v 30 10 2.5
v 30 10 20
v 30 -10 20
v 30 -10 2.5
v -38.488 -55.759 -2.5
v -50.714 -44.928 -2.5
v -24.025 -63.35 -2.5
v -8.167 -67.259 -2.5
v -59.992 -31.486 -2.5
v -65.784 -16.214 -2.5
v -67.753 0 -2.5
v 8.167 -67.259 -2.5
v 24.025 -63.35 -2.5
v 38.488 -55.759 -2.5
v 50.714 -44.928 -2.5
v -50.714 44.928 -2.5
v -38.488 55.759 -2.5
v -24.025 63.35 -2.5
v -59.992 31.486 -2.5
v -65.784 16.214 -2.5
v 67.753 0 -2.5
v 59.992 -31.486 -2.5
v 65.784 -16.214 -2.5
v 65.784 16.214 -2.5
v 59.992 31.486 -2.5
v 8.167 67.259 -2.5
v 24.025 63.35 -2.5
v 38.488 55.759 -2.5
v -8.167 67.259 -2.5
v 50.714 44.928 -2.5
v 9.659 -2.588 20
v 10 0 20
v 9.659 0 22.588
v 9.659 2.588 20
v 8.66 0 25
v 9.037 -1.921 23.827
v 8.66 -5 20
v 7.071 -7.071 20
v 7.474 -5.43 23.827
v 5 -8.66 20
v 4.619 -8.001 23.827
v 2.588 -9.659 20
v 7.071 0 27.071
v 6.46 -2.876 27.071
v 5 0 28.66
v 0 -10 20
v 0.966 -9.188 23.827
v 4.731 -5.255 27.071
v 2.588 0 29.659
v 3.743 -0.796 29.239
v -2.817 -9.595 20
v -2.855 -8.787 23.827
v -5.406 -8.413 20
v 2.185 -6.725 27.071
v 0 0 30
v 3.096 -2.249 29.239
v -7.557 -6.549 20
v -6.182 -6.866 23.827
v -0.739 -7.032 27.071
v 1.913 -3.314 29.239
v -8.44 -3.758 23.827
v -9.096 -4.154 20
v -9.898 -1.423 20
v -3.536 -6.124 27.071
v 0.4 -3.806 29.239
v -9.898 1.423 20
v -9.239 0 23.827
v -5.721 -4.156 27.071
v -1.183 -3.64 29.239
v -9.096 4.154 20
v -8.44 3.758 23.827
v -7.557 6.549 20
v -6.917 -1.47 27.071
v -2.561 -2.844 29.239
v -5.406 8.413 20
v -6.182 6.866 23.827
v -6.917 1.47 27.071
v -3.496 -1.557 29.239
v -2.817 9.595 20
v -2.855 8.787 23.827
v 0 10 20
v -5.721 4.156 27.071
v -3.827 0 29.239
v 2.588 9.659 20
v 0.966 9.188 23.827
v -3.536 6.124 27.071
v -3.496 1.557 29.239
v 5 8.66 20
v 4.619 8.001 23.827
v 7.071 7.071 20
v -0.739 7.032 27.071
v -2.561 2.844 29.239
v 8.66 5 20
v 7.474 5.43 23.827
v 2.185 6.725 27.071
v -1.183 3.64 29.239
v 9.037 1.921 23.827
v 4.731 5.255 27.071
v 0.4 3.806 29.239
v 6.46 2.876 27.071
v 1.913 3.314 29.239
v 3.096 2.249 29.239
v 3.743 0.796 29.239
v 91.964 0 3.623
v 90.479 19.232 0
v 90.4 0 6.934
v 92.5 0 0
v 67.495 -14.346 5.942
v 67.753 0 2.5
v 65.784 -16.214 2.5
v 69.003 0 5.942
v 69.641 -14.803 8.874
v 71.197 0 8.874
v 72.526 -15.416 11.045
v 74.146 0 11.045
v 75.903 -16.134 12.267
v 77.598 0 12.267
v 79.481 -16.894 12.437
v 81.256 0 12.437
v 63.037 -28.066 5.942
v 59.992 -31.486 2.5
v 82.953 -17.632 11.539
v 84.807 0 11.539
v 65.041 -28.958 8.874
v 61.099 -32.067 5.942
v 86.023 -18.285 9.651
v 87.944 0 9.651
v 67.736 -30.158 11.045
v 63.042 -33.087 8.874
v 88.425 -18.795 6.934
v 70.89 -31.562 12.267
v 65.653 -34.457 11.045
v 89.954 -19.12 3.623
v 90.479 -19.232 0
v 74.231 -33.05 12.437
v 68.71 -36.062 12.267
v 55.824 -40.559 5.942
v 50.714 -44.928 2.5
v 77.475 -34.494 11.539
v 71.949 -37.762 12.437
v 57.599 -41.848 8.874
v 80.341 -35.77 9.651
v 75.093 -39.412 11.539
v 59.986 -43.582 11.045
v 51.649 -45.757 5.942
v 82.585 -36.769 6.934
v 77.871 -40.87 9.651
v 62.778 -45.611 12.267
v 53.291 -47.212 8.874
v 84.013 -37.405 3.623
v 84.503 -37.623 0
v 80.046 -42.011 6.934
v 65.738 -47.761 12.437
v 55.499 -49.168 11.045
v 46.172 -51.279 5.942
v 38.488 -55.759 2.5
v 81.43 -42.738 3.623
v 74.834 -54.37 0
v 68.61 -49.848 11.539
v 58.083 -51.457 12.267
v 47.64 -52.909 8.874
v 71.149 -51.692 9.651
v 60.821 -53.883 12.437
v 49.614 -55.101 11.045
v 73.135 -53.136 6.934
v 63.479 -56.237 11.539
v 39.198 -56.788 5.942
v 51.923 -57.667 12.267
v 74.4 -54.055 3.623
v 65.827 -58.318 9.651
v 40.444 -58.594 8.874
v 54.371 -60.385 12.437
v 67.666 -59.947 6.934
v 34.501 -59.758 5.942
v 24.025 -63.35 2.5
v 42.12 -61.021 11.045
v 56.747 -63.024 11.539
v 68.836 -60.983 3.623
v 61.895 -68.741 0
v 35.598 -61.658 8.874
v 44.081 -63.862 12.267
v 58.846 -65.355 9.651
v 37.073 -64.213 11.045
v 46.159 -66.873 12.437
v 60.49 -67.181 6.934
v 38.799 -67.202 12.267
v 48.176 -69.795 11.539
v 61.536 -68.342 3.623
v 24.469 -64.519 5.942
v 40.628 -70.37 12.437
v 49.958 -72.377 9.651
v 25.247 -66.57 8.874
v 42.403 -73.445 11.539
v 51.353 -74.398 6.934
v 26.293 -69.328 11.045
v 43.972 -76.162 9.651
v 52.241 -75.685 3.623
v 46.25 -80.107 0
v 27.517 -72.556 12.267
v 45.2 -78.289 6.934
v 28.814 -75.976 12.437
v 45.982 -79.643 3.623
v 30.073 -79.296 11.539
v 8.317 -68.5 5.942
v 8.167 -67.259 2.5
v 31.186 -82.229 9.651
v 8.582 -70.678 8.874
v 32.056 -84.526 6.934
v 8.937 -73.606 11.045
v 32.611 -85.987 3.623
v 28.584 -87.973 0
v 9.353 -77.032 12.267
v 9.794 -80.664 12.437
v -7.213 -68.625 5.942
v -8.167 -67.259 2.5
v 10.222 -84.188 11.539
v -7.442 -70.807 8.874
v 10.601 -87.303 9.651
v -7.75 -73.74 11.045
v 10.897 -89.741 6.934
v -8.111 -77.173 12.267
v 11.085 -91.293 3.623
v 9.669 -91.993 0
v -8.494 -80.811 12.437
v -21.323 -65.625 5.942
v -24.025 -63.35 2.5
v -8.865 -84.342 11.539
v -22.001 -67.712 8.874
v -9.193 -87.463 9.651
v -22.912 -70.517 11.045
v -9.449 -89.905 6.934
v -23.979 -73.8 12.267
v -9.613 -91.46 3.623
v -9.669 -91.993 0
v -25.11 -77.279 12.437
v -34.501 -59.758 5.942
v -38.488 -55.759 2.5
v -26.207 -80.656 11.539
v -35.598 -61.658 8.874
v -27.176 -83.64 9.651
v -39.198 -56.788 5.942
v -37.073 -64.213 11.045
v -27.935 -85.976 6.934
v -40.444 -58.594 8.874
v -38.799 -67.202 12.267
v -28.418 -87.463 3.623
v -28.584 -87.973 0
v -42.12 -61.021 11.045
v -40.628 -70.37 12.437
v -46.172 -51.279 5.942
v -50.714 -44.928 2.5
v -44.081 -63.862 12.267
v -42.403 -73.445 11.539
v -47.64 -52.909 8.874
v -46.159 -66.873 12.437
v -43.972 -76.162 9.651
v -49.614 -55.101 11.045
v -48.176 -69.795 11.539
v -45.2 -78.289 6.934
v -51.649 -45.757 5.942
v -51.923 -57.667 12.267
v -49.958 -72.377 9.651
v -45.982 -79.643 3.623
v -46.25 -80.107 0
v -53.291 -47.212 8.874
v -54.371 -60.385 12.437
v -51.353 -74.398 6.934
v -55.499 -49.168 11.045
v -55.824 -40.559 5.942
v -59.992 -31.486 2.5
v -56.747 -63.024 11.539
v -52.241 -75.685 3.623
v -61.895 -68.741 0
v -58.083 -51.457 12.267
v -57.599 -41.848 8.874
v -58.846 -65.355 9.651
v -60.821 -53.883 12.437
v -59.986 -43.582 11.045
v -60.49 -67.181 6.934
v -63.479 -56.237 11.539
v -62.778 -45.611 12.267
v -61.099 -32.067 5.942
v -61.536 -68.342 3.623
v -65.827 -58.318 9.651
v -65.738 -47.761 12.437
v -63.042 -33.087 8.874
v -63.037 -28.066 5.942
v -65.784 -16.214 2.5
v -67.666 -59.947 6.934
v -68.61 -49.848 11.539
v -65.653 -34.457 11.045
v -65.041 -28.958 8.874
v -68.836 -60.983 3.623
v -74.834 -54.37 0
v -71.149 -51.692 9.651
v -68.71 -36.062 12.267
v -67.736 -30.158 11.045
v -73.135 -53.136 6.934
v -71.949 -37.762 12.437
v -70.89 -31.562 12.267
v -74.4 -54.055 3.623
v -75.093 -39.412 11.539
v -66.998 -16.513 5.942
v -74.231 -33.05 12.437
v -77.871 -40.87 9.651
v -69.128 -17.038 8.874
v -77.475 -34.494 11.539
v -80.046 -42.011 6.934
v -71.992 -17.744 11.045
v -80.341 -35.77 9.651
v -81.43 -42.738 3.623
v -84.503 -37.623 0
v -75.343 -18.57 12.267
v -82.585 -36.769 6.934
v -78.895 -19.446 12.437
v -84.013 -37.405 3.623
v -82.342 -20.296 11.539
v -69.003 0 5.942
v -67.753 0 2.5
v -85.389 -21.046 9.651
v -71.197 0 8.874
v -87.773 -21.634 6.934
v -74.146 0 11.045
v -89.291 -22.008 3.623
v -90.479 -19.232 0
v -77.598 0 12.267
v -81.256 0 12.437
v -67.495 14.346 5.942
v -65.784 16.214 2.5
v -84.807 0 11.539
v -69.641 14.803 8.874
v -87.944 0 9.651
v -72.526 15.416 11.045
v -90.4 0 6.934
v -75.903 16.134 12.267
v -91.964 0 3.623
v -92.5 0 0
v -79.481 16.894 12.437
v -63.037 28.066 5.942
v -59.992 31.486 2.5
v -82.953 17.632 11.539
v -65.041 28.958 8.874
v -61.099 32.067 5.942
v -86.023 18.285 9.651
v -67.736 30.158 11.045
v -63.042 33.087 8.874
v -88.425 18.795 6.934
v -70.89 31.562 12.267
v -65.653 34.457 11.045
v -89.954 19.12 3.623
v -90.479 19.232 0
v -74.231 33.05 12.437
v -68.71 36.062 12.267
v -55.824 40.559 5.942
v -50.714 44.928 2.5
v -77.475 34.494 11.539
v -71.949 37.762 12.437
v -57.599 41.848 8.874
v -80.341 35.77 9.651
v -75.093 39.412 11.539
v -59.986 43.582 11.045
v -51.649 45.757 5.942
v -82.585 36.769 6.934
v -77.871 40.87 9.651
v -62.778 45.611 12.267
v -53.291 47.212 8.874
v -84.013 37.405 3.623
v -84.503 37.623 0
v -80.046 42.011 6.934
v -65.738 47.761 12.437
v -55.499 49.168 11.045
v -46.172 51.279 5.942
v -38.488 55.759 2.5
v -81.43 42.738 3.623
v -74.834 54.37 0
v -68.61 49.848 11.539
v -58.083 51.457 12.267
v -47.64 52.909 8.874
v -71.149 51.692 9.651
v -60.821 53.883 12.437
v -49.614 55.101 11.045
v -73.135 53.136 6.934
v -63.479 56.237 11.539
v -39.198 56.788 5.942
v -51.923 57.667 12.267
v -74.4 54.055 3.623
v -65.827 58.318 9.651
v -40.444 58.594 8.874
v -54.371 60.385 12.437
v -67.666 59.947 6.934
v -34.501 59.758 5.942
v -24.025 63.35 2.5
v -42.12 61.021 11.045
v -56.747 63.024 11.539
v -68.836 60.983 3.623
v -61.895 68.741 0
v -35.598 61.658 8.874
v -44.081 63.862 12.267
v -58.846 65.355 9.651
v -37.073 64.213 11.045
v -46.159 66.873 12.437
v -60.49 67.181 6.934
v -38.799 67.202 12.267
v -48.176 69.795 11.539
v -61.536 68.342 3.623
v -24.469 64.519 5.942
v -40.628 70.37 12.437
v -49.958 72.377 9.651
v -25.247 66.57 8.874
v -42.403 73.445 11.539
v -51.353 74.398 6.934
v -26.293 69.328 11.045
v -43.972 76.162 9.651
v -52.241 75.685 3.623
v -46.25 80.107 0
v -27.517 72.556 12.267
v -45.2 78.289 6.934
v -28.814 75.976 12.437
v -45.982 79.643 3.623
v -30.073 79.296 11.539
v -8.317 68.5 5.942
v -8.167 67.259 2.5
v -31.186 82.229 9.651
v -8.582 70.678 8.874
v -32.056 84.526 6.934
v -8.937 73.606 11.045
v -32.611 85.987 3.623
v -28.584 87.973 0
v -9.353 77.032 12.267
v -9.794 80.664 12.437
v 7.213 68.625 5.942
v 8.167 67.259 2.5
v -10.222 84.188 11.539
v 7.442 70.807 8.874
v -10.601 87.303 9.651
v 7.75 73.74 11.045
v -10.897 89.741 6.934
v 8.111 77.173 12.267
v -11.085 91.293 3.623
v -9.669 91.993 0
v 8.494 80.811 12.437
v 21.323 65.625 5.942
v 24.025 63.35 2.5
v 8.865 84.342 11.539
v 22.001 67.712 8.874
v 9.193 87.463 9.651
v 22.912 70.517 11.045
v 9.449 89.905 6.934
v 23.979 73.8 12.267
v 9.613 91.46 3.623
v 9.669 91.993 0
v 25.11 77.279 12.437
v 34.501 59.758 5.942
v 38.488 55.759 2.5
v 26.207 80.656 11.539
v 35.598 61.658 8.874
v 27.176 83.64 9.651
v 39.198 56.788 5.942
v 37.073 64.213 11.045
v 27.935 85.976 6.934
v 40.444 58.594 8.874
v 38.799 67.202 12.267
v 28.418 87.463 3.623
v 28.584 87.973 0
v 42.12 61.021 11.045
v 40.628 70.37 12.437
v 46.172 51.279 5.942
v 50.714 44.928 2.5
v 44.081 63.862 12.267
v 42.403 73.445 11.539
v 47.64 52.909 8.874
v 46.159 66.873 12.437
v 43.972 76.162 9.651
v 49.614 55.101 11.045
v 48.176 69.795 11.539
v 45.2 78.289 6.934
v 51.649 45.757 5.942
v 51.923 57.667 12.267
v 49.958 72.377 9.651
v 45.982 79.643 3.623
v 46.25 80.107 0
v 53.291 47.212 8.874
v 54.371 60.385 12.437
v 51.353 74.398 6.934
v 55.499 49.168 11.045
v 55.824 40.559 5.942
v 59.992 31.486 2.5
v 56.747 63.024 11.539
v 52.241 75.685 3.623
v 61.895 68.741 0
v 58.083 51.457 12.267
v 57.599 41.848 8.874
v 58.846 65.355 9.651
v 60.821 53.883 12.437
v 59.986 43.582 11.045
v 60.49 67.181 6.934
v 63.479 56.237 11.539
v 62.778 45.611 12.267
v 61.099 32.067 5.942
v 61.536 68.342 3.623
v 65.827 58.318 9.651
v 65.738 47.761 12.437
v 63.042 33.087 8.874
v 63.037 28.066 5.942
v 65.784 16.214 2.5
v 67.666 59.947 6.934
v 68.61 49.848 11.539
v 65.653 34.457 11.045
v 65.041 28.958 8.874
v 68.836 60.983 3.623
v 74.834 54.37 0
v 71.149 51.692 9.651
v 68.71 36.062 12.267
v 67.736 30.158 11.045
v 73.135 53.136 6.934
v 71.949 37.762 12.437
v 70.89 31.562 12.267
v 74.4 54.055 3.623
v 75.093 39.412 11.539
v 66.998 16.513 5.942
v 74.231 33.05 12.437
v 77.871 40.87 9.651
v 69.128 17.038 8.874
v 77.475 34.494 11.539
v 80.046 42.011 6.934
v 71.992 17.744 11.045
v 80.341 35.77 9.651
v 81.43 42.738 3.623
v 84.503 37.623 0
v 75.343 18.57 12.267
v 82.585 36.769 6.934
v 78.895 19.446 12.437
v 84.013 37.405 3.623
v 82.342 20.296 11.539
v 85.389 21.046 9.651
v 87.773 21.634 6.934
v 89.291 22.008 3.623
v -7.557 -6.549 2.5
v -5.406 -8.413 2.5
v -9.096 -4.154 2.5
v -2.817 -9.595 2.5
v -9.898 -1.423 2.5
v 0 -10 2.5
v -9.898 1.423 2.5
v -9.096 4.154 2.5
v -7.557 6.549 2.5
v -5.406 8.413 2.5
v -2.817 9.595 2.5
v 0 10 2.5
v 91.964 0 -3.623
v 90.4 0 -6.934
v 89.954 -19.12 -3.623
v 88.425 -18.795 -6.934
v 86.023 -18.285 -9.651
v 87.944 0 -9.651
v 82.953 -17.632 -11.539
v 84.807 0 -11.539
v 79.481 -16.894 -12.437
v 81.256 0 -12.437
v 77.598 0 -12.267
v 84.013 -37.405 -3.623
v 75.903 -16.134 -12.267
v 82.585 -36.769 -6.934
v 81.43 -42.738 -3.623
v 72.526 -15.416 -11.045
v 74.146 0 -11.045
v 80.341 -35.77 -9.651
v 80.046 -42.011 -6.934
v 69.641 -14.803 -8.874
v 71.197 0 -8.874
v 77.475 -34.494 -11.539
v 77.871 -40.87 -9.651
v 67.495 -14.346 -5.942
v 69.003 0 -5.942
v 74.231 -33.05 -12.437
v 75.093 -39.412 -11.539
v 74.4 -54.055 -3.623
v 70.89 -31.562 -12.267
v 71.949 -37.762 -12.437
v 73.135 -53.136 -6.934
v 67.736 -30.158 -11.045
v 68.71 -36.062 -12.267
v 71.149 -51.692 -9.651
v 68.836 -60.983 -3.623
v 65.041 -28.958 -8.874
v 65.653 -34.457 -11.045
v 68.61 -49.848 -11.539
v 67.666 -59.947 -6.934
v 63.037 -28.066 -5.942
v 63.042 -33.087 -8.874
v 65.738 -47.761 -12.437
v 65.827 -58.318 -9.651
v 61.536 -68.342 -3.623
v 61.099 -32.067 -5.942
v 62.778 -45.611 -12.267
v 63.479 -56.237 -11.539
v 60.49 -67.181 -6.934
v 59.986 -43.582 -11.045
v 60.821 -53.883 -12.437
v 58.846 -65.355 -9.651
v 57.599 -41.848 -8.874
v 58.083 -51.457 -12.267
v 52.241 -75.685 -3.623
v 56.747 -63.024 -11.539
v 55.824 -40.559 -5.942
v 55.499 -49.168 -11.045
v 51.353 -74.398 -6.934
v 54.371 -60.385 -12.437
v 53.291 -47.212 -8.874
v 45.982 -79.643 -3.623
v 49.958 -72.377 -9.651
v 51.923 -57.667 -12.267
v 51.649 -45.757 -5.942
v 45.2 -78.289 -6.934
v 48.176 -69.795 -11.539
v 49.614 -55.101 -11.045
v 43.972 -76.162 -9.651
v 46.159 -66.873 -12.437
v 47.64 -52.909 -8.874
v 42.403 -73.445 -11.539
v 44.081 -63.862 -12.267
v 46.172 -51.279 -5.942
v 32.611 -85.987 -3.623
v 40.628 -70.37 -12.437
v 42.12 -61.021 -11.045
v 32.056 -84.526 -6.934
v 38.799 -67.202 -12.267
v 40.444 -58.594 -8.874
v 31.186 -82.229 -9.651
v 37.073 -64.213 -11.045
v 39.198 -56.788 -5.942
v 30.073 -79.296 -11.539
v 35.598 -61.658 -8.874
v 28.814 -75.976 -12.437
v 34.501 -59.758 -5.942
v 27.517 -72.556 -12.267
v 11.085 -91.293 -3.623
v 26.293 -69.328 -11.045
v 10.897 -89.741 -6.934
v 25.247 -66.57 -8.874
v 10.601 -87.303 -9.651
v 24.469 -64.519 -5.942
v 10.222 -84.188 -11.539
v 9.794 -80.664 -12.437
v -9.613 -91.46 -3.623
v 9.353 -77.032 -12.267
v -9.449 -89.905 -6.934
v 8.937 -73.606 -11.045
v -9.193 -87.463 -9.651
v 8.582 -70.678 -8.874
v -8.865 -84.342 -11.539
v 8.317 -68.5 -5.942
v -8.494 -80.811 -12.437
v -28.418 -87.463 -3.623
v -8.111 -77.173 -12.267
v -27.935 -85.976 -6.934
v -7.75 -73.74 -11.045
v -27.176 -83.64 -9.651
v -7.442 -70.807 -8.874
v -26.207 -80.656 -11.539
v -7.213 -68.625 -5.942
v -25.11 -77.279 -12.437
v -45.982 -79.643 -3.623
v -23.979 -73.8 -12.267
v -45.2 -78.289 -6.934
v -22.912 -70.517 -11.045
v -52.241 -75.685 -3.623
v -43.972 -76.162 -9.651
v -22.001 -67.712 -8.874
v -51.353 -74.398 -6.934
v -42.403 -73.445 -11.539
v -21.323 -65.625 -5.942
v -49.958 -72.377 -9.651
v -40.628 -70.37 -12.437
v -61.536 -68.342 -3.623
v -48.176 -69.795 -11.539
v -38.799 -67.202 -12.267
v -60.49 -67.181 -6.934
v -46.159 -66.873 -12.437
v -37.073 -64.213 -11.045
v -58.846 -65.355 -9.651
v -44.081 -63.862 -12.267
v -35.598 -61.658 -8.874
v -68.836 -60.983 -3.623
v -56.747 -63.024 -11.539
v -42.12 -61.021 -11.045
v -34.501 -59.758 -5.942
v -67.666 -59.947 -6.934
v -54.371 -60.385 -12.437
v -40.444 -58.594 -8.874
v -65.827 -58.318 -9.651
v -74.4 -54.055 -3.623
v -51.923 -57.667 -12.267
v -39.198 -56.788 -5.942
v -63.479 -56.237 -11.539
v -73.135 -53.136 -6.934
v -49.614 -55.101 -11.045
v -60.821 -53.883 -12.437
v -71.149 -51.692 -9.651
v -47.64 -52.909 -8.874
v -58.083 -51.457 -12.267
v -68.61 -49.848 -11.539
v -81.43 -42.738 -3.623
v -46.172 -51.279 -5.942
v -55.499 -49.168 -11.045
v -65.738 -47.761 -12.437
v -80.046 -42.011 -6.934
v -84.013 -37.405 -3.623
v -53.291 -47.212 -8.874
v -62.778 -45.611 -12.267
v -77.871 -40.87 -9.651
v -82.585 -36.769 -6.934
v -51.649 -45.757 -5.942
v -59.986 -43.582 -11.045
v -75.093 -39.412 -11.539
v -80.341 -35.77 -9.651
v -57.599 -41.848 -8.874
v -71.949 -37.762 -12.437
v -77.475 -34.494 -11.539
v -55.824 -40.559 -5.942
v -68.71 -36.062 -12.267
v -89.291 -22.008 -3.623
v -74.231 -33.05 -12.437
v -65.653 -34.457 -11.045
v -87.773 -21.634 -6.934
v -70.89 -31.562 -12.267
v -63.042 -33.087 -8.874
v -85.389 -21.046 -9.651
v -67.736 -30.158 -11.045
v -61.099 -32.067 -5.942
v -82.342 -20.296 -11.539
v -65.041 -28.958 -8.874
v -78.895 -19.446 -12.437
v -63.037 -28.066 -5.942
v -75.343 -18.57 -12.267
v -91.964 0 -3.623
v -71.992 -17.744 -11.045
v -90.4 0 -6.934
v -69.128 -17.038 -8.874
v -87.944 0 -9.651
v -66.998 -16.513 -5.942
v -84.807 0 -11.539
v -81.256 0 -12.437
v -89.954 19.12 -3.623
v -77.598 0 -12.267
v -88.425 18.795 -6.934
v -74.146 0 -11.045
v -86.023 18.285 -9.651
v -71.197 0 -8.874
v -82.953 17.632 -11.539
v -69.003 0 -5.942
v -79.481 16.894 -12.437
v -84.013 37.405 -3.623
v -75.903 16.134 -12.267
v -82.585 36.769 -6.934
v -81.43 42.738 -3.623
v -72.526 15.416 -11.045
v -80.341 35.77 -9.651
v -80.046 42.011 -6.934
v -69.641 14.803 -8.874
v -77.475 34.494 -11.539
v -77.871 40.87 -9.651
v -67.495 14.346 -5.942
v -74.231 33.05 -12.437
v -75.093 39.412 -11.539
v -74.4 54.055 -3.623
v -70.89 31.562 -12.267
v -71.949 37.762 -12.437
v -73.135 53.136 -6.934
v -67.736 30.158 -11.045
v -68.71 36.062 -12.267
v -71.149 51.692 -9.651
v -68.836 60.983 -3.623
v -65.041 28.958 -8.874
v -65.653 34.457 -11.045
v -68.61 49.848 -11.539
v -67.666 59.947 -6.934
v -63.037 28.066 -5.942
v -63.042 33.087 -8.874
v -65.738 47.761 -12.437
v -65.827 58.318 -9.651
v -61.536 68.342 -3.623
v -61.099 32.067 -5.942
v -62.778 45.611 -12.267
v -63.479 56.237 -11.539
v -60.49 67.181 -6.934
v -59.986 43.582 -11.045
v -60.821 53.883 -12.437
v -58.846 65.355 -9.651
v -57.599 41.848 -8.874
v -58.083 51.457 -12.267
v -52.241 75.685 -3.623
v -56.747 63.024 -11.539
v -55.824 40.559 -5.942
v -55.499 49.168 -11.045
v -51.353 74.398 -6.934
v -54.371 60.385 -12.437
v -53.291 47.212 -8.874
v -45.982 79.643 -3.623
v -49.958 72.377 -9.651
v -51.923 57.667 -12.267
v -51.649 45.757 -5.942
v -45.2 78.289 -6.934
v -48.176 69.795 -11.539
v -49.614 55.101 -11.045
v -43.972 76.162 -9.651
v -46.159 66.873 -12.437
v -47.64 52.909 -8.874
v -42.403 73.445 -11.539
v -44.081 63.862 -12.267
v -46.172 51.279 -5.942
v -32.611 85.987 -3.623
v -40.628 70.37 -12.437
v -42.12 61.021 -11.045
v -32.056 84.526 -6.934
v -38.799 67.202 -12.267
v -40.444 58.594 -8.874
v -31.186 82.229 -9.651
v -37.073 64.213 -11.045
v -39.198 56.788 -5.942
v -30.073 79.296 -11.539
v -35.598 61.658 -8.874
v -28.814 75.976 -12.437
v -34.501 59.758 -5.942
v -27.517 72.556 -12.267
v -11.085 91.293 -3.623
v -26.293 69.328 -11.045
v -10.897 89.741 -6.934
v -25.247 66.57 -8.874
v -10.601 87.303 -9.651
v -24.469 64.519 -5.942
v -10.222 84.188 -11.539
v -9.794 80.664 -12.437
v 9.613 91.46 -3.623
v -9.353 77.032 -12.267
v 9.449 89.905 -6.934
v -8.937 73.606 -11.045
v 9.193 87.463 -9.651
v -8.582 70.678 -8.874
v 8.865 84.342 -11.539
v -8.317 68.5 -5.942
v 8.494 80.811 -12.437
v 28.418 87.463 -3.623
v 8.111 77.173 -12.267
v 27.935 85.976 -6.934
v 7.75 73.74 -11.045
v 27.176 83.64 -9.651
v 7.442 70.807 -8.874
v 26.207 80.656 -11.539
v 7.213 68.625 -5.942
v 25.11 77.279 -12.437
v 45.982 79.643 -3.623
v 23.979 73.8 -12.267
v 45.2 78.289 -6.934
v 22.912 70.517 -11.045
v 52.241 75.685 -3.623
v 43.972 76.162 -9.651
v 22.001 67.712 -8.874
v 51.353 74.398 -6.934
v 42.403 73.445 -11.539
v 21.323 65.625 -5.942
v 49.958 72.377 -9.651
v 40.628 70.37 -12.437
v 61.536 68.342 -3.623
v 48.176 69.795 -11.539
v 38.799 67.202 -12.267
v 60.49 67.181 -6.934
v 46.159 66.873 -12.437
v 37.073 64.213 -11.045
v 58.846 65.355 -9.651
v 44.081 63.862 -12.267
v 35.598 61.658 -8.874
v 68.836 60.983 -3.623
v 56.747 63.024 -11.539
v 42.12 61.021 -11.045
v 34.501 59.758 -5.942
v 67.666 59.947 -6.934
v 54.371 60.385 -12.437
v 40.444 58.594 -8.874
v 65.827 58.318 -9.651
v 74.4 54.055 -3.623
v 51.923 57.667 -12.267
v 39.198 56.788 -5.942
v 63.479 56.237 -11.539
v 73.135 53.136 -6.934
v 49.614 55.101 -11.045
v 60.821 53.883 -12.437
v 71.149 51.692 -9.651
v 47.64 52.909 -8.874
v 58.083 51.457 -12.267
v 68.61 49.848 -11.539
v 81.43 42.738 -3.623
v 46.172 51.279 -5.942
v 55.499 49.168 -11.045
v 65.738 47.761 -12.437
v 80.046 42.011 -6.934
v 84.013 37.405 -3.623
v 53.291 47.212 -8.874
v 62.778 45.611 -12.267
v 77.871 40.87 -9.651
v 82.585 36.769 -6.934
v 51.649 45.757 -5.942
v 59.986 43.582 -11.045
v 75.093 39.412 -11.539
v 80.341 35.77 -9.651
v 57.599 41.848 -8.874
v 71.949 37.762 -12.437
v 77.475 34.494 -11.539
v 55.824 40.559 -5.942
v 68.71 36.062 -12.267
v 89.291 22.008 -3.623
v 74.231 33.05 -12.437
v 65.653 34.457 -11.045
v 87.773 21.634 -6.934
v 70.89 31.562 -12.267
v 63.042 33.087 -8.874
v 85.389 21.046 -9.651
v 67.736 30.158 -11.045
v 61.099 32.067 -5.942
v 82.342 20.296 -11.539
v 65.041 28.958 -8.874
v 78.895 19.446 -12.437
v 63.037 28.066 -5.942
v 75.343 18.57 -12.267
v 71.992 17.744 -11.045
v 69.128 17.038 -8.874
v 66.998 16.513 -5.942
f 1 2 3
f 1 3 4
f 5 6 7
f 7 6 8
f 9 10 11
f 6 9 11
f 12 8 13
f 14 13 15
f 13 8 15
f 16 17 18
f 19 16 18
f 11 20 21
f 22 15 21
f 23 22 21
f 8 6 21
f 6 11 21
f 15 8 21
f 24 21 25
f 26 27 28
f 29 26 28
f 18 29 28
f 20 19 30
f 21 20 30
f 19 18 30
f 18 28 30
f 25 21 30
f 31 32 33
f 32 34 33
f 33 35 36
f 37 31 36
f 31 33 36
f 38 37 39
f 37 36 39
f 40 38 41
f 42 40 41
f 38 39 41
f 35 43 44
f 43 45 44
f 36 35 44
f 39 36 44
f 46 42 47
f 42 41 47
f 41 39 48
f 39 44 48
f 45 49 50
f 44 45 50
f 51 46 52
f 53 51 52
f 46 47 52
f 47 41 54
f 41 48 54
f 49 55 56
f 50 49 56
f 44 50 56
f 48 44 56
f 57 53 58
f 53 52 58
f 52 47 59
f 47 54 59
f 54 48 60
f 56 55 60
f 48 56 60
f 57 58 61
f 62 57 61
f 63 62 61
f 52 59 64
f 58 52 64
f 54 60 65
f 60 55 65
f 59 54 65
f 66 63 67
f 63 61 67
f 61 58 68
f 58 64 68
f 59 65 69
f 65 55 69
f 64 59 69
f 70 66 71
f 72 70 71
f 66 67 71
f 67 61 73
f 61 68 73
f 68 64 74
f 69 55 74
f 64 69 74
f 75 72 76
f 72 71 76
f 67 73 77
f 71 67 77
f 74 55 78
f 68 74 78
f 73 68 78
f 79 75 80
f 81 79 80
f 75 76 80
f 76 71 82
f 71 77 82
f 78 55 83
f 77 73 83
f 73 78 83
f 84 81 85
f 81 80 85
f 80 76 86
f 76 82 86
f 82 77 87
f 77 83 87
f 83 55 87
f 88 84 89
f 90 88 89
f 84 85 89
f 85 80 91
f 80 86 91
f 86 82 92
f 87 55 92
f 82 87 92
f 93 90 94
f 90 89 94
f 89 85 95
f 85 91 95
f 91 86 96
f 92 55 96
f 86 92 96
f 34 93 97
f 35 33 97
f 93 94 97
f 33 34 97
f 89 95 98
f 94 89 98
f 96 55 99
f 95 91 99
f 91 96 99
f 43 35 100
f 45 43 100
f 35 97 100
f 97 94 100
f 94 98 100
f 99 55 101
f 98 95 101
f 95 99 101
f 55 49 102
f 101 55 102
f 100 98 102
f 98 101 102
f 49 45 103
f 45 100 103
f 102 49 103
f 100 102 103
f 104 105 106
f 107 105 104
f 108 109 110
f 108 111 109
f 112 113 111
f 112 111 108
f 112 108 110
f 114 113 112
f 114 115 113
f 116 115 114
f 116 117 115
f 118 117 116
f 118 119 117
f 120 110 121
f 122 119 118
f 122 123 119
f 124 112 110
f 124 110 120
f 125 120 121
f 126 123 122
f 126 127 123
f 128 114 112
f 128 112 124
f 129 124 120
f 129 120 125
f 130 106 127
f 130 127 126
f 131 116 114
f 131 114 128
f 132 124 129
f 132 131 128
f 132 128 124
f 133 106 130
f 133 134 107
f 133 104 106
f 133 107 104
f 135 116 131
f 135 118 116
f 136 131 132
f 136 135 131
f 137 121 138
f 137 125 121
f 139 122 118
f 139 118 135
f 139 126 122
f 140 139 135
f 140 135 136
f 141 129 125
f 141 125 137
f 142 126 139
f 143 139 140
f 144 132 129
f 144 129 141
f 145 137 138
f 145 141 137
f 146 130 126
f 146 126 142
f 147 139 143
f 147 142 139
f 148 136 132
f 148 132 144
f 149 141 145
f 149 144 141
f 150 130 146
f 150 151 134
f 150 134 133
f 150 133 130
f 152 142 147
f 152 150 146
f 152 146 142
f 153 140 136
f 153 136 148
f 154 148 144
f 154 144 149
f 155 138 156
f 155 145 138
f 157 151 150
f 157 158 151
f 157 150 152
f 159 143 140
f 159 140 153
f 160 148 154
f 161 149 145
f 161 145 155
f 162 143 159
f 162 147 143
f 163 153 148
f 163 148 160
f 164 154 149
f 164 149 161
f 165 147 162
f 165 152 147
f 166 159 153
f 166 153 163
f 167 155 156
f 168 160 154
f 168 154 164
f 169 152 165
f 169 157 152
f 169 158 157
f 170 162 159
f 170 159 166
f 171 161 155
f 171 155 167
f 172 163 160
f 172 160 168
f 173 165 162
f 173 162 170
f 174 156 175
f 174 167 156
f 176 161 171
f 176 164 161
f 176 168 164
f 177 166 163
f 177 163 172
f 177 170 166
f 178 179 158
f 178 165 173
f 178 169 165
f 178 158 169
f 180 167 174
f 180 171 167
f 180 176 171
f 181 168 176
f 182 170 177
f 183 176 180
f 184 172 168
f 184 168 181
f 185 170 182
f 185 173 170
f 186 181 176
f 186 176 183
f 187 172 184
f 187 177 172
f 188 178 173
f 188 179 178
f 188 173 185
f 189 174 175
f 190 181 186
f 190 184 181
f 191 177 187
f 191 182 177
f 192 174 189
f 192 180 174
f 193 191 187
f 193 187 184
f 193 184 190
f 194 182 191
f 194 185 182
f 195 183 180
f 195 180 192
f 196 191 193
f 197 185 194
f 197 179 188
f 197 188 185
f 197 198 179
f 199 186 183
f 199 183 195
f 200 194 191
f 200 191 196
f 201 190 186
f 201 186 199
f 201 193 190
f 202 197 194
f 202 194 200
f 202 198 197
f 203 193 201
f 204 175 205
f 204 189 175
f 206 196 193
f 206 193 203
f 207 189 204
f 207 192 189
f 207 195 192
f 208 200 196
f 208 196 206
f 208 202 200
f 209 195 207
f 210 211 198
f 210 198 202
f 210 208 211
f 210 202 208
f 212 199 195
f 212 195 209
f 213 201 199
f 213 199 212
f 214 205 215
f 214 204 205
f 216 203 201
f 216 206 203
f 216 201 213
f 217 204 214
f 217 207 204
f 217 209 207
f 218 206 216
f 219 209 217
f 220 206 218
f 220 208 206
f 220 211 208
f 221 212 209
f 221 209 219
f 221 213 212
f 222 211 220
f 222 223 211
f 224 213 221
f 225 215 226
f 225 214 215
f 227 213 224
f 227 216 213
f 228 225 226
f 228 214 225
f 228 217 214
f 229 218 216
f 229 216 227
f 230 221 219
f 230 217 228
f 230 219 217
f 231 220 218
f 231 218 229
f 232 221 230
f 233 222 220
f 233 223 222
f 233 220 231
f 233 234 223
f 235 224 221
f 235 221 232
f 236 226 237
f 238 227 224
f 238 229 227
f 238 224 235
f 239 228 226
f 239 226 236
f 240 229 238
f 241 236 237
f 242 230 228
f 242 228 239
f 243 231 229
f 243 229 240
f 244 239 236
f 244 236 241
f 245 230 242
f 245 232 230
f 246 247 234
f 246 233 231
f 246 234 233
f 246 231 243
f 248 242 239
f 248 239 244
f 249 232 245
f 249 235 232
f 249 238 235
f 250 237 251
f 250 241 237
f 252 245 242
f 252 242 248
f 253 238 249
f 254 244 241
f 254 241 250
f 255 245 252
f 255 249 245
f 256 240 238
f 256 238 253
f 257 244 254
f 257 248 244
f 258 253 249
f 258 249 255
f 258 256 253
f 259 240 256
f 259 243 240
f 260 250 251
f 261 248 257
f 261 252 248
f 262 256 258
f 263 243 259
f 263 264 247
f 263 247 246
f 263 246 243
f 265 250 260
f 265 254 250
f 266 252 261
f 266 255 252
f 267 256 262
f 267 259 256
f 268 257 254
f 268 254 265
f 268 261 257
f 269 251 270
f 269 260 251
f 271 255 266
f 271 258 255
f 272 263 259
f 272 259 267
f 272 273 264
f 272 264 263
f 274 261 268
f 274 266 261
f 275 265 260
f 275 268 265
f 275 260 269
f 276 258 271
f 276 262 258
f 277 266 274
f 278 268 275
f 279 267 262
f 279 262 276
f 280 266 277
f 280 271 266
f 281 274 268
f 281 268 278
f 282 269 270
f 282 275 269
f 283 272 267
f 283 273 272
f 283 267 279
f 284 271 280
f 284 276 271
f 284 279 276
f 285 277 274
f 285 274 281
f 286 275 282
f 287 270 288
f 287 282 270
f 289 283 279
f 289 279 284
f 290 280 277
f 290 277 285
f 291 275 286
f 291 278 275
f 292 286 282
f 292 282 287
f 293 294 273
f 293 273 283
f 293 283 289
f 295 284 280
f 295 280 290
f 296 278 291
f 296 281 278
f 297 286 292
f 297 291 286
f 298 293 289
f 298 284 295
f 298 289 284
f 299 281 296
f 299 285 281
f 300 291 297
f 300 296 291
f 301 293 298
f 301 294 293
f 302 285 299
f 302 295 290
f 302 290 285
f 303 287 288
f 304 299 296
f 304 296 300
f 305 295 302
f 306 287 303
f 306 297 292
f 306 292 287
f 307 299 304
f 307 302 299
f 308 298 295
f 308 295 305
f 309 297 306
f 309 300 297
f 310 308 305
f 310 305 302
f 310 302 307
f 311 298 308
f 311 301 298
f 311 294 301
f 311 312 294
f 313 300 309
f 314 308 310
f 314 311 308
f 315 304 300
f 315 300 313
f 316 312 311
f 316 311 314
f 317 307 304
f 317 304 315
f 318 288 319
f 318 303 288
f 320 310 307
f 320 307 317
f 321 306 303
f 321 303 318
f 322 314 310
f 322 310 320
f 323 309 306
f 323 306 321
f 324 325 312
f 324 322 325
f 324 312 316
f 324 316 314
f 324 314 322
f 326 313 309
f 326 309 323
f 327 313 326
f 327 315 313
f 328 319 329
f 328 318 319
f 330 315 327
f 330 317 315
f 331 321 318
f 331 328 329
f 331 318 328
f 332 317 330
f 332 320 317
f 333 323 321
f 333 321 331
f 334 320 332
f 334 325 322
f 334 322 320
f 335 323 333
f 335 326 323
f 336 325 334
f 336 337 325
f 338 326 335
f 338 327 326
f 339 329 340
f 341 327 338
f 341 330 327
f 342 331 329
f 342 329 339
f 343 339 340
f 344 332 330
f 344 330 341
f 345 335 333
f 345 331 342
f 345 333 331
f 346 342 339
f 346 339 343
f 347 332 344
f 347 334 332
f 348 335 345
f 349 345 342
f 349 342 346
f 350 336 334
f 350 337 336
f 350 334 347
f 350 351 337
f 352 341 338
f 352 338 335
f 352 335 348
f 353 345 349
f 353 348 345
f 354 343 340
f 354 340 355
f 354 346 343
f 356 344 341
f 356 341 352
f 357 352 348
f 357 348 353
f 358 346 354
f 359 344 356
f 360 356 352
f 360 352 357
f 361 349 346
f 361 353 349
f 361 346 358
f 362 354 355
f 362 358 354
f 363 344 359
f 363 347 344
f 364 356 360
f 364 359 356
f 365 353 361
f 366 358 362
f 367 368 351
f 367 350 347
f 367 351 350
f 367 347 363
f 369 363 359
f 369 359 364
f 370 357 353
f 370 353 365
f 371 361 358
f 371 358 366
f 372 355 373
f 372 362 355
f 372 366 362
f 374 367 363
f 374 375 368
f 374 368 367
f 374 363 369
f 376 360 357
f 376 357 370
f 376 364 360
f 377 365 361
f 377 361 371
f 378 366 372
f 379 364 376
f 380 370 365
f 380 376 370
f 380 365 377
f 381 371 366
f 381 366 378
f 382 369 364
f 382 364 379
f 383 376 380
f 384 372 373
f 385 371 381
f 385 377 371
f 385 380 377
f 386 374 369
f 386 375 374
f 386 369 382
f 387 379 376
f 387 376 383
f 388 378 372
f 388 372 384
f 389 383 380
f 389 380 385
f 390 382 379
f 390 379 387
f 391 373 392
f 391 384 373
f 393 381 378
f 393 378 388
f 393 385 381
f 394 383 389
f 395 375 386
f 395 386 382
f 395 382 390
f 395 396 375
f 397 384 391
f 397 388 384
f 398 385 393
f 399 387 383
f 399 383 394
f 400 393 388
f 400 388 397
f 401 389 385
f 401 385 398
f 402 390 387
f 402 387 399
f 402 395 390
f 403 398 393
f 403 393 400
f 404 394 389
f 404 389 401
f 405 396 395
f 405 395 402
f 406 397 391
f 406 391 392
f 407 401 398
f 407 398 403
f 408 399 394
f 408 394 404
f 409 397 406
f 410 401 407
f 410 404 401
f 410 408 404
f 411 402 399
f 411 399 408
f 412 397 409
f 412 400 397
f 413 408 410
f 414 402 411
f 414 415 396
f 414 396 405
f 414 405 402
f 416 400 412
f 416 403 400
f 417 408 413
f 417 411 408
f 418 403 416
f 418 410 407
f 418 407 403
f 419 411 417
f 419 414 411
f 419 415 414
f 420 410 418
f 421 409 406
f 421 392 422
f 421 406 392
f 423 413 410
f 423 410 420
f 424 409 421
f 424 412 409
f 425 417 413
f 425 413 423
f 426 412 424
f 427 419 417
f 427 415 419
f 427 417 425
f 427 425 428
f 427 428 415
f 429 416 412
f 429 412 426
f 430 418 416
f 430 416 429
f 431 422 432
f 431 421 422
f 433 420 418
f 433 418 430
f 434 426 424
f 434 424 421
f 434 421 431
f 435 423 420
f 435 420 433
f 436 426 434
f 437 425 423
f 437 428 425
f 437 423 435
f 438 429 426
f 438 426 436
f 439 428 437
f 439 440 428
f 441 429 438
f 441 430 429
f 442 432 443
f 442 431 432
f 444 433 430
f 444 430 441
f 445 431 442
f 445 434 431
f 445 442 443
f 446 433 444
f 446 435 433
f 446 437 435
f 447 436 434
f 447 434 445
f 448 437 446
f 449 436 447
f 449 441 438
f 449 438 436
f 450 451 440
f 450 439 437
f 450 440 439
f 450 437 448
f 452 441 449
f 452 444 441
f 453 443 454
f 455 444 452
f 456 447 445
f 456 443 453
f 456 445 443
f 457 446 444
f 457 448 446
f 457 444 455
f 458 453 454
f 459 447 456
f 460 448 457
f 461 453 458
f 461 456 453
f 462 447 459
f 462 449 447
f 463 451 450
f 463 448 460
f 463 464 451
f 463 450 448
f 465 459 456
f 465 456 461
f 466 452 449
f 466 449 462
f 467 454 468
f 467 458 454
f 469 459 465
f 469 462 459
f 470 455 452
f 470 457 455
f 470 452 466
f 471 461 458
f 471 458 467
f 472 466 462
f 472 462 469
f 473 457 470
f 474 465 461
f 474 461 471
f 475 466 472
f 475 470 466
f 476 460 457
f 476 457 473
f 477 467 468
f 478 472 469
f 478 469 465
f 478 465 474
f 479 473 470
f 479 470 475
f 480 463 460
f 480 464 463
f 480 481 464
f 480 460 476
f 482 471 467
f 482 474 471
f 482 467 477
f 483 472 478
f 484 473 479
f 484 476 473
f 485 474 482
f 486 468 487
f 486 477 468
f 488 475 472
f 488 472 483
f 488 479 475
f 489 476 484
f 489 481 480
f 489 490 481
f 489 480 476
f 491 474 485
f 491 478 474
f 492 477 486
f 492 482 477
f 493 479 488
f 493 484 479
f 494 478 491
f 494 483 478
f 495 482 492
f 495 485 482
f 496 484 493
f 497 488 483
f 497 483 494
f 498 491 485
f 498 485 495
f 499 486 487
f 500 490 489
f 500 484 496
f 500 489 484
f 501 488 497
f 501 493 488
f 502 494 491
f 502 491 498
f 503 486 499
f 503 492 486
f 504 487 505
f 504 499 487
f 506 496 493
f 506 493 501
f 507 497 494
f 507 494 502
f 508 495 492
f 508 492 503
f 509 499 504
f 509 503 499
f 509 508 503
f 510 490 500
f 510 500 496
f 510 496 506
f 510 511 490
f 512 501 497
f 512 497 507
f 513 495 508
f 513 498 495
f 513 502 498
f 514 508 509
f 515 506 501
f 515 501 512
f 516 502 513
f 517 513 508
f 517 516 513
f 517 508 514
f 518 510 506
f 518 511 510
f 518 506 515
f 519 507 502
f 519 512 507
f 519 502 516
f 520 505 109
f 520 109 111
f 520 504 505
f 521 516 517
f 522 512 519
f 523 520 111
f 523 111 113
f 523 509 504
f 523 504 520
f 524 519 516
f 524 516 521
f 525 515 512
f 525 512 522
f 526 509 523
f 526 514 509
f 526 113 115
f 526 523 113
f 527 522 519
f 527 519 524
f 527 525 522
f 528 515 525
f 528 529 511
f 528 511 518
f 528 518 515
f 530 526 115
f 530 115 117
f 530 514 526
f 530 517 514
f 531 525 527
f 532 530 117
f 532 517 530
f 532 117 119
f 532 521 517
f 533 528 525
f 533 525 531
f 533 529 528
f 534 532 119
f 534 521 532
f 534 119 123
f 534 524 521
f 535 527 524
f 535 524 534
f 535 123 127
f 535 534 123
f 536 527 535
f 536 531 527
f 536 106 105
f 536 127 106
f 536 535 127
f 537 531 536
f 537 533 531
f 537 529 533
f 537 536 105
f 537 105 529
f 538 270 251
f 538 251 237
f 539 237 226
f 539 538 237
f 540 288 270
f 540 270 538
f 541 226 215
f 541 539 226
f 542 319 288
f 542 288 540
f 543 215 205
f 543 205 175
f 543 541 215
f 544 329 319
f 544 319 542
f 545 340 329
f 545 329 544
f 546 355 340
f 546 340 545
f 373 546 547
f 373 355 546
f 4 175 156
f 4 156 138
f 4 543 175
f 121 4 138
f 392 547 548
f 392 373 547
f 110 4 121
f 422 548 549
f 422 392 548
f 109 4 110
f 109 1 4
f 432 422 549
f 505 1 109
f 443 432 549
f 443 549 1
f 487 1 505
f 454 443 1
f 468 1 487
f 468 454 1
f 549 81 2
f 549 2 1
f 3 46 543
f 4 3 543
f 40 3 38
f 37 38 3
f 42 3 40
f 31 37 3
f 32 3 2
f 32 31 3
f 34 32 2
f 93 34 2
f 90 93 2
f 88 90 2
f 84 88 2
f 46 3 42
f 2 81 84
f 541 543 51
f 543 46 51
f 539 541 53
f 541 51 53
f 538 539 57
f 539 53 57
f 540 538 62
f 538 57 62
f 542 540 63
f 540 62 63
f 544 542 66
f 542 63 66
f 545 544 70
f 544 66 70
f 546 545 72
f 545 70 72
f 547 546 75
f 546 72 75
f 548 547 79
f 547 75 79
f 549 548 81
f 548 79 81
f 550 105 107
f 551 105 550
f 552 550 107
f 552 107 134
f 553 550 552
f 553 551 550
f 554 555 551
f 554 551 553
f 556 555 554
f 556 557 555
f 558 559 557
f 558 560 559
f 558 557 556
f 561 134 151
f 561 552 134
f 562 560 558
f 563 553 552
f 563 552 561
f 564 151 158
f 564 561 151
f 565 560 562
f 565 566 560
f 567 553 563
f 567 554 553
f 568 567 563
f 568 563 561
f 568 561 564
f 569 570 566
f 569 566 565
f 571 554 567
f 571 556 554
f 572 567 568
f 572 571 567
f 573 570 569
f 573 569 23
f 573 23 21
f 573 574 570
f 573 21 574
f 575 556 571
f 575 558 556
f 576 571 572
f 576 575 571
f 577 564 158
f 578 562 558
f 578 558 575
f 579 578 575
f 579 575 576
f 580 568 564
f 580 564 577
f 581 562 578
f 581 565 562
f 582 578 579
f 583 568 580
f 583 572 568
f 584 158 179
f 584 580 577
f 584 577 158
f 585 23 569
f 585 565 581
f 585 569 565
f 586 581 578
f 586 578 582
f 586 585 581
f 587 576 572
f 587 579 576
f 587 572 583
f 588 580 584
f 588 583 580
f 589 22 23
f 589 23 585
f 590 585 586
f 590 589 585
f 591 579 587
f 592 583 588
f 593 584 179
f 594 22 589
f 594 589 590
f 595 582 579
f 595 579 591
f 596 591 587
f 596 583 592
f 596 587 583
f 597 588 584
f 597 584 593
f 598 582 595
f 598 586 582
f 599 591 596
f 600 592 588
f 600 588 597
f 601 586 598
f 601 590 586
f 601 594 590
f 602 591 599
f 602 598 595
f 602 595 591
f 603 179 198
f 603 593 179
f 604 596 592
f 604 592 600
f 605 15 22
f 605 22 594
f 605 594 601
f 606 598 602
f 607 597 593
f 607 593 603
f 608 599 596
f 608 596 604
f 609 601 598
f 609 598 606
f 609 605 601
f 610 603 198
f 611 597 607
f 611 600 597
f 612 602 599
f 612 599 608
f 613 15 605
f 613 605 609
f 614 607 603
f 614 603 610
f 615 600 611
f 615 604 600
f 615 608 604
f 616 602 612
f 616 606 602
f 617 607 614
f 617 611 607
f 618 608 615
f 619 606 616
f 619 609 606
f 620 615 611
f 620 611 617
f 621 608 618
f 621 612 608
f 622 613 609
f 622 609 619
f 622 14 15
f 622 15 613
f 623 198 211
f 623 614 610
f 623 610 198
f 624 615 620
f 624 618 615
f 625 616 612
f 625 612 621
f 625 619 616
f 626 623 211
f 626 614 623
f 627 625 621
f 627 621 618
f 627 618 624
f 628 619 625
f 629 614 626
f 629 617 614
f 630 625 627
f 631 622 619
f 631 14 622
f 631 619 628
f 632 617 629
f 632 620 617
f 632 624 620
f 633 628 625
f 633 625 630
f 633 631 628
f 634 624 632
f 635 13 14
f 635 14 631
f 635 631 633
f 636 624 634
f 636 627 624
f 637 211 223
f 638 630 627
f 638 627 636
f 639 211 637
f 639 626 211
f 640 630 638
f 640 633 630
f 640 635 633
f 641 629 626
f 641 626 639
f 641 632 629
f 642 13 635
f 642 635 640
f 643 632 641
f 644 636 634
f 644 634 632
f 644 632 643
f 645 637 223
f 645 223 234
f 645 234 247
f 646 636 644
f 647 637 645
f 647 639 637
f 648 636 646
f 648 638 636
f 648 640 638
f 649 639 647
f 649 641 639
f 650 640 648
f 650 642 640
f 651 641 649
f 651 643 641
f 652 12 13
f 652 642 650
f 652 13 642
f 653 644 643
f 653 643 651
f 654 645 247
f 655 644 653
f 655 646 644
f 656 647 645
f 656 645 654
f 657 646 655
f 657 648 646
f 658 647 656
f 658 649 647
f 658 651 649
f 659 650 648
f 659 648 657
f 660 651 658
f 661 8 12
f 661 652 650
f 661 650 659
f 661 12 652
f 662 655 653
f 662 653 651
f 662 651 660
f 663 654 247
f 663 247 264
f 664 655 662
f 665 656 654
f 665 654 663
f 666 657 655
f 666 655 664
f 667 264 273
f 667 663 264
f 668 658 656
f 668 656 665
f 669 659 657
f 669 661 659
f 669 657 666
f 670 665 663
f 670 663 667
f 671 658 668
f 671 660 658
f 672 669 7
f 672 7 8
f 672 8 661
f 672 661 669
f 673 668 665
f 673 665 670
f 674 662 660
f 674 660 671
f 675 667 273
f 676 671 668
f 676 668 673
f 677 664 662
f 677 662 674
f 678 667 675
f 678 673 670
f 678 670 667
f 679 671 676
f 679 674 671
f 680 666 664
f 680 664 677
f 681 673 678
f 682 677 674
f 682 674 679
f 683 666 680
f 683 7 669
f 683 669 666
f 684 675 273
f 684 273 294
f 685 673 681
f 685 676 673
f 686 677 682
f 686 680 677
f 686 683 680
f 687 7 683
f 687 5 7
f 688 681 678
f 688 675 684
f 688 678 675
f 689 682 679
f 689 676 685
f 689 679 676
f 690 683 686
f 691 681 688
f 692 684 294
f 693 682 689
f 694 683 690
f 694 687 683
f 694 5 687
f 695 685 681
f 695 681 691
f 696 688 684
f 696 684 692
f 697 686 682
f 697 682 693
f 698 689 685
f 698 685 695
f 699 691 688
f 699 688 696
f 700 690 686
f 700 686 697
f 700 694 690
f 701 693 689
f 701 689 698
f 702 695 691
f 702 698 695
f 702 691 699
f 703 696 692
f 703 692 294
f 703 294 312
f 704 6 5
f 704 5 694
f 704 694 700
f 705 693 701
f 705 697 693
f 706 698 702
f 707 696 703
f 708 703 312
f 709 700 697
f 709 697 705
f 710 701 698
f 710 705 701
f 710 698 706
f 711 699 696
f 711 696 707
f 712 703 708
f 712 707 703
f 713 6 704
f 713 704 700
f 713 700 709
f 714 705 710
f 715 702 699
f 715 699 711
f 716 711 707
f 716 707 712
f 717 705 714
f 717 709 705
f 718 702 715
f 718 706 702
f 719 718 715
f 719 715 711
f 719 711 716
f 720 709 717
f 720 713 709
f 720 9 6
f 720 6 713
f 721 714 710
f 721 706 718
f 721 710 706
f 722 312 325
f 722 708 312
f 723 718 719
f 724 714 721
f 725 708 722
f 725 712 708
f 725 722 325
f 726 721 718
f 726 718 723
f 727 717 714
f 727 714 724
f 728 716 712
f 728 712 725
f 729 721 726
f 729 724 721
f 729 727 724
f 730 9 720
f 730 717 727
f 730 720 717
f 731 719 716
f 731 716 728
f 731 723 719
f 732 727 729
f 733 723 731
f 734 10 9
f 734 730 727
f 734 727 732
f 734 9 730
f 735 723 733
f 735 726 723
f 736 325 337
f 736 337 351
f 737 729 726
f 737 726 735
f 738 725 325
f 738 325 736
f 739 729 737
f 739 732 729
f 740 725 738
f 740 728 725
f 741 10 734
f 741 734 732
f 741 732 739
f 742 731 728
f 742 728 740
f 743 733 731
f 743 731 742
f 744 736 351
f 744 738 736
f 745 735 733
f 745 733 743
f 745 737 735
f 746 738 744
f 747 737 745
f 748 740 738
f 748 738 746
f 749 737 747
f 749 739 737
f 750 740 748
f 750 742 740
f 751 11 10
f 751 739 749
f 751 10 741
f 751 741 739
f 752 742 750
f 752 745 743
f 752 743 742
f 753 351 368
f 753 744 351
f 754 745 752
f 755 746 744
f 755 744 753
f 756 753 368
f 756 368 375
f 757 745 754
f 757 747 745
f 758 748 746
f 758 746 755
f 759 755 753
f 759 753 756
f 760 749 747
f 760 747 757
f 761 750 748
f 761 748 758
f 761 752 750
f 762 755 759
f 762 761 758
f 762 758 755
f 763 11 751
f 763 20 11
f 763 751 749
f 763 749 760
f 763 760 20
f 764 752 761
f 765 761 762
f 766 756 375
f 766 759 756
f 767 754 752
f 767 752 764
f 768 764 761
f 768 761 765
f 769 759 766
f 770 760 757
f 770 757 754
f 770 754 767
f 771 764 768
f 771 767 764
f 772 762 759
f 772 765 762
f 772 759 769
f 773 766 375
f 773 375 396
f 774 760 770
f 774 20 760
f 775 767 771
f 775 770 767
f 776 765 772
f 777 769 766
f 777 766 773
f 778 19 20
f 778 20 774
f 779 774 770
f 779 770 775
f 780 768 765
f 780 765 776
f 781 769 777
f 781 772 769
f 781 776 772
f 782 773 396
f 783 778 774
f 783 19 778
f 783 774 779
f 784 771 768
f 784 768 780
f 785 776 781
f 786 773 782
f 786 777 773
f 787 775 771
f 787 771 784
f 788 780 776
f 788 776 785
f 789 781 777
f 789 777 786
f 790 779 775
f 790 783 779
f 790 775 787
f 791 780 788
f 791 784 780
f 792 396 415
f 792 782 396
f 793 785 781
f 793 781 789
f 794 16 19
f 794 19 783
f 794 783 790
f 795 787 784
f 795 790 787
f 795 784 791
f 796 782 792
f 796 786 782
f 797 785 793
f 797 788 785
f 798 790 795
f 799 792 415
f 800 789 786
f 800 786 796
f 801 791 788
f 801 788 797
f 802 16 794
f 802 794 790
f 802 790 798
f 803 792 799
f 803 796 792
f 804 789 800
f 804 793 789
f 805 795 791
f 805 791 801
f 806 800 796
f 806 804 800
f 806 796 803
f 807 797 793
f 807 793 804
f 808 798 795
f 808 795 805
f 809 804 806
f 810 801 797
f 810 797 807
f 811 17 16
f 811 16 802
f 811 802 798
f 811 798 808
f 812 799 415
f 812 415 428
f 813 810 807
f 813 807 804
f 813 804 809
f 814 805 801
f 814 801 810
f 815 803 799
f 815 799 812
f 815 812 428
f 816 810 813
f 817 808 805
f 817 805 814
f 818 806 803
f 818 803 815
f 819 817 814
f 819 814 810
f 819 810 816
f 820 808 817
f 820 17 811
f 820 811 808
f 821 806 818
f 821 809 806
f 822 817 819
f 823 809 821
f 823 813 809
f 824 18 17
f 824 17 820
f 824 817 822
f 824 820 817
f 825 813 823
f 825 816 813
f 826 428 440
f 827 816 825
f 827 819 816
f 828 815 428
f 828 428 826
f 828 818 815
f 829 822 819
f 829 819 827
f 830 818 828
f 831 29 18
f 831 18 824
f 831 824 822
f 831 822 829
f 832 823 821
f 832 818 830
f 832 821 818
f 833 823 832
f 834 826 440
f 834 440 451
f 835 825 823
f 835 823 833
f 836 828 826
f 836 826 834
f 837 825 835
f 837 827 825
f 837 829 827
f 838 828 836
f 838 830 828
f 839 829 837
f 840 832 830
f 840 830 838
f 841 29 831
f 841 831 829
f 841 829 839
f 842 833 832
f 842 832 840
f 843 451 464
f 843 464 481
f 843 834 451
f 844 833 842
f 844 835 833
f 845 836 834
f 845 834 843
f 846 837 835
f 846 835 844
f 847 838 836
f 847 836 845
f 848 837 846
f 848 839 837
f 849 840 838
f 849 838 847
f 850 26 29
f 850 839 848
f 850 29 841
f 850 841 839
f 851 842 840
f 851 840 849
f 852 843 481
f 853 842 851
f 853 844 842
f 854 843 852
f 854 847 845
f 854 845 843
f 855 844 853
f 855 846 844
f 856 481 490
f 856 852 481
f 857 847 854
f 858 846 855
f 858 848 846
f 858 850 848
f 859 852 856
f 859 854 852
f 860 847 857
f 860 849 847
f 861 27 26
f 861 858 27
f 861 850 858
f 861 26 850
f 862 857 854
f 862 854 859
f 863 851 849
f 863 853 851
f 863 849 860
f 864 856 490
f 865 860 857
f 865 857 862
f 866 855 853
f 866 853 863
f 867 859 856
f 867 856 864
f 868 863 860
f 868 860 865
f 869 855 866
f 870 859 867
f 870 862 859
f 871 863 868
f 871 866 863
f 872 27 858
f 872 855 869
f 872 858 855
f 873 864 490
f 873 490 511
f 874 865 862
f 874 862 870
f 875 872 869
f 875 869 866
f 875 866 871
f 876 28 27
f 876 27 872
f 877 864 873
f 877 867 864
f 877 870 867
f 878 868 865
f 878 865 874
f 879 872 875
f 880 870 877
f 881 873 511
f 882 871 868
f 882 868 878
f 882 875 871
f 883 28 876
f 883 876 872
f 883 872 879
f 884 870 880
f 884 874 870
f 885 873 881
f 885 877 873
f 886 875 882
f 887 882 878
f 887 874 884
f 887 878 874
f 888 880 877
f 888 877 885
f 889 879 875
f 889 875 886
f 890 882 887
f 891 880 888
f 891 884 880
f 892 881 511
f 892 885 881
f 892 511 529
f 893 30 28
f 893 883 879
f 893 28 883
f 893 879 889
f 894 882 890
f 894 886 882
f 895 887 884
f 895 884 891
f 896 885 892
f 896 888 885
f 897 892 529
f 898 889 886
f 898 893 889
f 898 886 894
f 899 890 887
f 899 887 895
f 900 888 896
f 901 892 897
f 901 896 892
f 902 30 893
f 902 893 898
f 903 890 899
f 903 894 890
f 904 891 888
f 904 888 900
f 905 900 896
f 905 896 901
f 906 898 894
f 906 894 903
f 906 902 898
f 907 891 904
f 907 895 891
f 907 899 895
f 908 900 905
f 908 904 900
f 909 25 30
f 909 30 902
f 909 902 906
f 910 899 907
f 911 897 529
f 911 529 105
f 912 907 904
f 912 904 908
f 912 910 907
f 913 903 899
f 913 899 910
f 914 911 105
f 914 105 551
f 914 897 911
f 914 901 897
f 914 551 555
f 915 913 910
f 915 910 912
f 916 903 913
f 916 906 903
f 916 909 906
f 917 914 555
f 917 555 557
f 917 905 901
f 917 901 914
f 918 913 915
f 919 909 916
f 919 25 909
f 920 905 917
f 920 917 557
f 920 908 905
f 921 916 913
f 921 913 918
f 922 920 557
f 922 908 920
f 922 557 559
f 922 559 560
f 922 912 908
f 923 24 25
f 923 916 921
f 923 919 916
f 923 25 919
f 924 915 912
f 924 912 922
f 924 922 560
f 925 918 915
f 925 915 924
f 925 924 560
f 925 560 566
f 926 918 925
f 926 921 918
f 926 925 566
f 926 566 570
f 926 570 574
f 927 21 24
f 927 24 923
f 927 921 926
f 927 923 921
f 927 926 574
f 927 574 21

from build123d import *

# Parameters (mm, degrees)
SKETCH1_R                       = 12.5
BOSS_EXTRUDE1_REACH             = 133.411
SKETCH2_W                       = 160
SKETCH2_H                       = 5
BOSS_EXTRUDE1_DIRECTION_2_REACH = 133.411
SKETCH6_W                       = 17.5
SKETCH6_H                       = 20
BOSS_EXTRUDE2_DEPTH             = 30


with BuildPart() as part:
    # Sketch1 → Revolve1 (revolve)
    with BuildSketch(Plane(origin=(0, 0, 0), x_dir=(1, 0, 0), z_dir=(0, 1, 0))):
        with Locations((80, 0)):
            Circle(SKETCH1_R)
    revolve(axis=Axis((0, 0, 0), (0, 0, -1)))

    # Sketch2 → Boss-Extrude1 (add, up to next)
    with BuildSketch(Plane(origin=(0, 0, 0), x_dir=(1, 0, 0), z_dir=(0, 1, 0)), mode=Mode.PRIVATE) as boss_extrude1_sk1:
        Rectangle(SKETCH2_W, SKETCH2_H)
    boss_extrude1_tool1 = extrude(boss_extrude1_sk1.sketch, amount=BOSS_EXTRUDE1_REACH, mode=Mode.PRIVATE) - part.part
    add(boss_extrude1_tool1.solids().sort_by_distance((0, 0, 0))[0])

    # Sketch2 → Boss-Extrude1 direction 2 (add, up to next)
    with BuildSketch(Plane(origin=(0, 0, 0), x_dir=(1, 0, 0), z_dir=(0, 1, 0)), mode=Mode.PRIVATE) as boss_extrude1_direction_2_sk1:
        Rectangle(SKETCH2_W, SKETCH2_H)
    boss_extrude1_direction_2_tool1 = extrude(boss_extrude1_direction_2_sk1.sketch, amount=-BOSS_EXTRUDE1_DIRECTION_2_REACH, mode=Mode.PRIVATE) - part.part
    add(boss_extrude1_direction_2_tool1.solids().sort_by_distance((0, 0, 0))[0])

    # Sketch4 → Revolve2 (revolve)
    with BuildSketch(Plane(origin=(0, 0, 0), x_dir=(1, 0, 0), z_dir=(0, 1, 0))):
        with BuildLine():
            Line((0, -30), (0, 0))
            Line((0, 0), (10, 0))
            Line((10, 0), (10, -20))
            ThreePointArc((10, -20), (7.071067812, -27.071067812), (0, -30))
        make_face()
    revolve(axis=Axis((0, 0, 30), (0, 0, -1)))

    # Sketch6 → Boss-Extrude2 (add)
    with BuildSketch(Plane(origin=(0, 0, 0), x_dir=(0, 0, -1), z_dir=(1, 0, 0))):
        with Locations((-11.25, 0)):
            Rectangle(SKETCH6_W, SKETCH6_H)
    extrude(amount=BOSS_EXTRUDE2_DEPTH)


solid = part.part
